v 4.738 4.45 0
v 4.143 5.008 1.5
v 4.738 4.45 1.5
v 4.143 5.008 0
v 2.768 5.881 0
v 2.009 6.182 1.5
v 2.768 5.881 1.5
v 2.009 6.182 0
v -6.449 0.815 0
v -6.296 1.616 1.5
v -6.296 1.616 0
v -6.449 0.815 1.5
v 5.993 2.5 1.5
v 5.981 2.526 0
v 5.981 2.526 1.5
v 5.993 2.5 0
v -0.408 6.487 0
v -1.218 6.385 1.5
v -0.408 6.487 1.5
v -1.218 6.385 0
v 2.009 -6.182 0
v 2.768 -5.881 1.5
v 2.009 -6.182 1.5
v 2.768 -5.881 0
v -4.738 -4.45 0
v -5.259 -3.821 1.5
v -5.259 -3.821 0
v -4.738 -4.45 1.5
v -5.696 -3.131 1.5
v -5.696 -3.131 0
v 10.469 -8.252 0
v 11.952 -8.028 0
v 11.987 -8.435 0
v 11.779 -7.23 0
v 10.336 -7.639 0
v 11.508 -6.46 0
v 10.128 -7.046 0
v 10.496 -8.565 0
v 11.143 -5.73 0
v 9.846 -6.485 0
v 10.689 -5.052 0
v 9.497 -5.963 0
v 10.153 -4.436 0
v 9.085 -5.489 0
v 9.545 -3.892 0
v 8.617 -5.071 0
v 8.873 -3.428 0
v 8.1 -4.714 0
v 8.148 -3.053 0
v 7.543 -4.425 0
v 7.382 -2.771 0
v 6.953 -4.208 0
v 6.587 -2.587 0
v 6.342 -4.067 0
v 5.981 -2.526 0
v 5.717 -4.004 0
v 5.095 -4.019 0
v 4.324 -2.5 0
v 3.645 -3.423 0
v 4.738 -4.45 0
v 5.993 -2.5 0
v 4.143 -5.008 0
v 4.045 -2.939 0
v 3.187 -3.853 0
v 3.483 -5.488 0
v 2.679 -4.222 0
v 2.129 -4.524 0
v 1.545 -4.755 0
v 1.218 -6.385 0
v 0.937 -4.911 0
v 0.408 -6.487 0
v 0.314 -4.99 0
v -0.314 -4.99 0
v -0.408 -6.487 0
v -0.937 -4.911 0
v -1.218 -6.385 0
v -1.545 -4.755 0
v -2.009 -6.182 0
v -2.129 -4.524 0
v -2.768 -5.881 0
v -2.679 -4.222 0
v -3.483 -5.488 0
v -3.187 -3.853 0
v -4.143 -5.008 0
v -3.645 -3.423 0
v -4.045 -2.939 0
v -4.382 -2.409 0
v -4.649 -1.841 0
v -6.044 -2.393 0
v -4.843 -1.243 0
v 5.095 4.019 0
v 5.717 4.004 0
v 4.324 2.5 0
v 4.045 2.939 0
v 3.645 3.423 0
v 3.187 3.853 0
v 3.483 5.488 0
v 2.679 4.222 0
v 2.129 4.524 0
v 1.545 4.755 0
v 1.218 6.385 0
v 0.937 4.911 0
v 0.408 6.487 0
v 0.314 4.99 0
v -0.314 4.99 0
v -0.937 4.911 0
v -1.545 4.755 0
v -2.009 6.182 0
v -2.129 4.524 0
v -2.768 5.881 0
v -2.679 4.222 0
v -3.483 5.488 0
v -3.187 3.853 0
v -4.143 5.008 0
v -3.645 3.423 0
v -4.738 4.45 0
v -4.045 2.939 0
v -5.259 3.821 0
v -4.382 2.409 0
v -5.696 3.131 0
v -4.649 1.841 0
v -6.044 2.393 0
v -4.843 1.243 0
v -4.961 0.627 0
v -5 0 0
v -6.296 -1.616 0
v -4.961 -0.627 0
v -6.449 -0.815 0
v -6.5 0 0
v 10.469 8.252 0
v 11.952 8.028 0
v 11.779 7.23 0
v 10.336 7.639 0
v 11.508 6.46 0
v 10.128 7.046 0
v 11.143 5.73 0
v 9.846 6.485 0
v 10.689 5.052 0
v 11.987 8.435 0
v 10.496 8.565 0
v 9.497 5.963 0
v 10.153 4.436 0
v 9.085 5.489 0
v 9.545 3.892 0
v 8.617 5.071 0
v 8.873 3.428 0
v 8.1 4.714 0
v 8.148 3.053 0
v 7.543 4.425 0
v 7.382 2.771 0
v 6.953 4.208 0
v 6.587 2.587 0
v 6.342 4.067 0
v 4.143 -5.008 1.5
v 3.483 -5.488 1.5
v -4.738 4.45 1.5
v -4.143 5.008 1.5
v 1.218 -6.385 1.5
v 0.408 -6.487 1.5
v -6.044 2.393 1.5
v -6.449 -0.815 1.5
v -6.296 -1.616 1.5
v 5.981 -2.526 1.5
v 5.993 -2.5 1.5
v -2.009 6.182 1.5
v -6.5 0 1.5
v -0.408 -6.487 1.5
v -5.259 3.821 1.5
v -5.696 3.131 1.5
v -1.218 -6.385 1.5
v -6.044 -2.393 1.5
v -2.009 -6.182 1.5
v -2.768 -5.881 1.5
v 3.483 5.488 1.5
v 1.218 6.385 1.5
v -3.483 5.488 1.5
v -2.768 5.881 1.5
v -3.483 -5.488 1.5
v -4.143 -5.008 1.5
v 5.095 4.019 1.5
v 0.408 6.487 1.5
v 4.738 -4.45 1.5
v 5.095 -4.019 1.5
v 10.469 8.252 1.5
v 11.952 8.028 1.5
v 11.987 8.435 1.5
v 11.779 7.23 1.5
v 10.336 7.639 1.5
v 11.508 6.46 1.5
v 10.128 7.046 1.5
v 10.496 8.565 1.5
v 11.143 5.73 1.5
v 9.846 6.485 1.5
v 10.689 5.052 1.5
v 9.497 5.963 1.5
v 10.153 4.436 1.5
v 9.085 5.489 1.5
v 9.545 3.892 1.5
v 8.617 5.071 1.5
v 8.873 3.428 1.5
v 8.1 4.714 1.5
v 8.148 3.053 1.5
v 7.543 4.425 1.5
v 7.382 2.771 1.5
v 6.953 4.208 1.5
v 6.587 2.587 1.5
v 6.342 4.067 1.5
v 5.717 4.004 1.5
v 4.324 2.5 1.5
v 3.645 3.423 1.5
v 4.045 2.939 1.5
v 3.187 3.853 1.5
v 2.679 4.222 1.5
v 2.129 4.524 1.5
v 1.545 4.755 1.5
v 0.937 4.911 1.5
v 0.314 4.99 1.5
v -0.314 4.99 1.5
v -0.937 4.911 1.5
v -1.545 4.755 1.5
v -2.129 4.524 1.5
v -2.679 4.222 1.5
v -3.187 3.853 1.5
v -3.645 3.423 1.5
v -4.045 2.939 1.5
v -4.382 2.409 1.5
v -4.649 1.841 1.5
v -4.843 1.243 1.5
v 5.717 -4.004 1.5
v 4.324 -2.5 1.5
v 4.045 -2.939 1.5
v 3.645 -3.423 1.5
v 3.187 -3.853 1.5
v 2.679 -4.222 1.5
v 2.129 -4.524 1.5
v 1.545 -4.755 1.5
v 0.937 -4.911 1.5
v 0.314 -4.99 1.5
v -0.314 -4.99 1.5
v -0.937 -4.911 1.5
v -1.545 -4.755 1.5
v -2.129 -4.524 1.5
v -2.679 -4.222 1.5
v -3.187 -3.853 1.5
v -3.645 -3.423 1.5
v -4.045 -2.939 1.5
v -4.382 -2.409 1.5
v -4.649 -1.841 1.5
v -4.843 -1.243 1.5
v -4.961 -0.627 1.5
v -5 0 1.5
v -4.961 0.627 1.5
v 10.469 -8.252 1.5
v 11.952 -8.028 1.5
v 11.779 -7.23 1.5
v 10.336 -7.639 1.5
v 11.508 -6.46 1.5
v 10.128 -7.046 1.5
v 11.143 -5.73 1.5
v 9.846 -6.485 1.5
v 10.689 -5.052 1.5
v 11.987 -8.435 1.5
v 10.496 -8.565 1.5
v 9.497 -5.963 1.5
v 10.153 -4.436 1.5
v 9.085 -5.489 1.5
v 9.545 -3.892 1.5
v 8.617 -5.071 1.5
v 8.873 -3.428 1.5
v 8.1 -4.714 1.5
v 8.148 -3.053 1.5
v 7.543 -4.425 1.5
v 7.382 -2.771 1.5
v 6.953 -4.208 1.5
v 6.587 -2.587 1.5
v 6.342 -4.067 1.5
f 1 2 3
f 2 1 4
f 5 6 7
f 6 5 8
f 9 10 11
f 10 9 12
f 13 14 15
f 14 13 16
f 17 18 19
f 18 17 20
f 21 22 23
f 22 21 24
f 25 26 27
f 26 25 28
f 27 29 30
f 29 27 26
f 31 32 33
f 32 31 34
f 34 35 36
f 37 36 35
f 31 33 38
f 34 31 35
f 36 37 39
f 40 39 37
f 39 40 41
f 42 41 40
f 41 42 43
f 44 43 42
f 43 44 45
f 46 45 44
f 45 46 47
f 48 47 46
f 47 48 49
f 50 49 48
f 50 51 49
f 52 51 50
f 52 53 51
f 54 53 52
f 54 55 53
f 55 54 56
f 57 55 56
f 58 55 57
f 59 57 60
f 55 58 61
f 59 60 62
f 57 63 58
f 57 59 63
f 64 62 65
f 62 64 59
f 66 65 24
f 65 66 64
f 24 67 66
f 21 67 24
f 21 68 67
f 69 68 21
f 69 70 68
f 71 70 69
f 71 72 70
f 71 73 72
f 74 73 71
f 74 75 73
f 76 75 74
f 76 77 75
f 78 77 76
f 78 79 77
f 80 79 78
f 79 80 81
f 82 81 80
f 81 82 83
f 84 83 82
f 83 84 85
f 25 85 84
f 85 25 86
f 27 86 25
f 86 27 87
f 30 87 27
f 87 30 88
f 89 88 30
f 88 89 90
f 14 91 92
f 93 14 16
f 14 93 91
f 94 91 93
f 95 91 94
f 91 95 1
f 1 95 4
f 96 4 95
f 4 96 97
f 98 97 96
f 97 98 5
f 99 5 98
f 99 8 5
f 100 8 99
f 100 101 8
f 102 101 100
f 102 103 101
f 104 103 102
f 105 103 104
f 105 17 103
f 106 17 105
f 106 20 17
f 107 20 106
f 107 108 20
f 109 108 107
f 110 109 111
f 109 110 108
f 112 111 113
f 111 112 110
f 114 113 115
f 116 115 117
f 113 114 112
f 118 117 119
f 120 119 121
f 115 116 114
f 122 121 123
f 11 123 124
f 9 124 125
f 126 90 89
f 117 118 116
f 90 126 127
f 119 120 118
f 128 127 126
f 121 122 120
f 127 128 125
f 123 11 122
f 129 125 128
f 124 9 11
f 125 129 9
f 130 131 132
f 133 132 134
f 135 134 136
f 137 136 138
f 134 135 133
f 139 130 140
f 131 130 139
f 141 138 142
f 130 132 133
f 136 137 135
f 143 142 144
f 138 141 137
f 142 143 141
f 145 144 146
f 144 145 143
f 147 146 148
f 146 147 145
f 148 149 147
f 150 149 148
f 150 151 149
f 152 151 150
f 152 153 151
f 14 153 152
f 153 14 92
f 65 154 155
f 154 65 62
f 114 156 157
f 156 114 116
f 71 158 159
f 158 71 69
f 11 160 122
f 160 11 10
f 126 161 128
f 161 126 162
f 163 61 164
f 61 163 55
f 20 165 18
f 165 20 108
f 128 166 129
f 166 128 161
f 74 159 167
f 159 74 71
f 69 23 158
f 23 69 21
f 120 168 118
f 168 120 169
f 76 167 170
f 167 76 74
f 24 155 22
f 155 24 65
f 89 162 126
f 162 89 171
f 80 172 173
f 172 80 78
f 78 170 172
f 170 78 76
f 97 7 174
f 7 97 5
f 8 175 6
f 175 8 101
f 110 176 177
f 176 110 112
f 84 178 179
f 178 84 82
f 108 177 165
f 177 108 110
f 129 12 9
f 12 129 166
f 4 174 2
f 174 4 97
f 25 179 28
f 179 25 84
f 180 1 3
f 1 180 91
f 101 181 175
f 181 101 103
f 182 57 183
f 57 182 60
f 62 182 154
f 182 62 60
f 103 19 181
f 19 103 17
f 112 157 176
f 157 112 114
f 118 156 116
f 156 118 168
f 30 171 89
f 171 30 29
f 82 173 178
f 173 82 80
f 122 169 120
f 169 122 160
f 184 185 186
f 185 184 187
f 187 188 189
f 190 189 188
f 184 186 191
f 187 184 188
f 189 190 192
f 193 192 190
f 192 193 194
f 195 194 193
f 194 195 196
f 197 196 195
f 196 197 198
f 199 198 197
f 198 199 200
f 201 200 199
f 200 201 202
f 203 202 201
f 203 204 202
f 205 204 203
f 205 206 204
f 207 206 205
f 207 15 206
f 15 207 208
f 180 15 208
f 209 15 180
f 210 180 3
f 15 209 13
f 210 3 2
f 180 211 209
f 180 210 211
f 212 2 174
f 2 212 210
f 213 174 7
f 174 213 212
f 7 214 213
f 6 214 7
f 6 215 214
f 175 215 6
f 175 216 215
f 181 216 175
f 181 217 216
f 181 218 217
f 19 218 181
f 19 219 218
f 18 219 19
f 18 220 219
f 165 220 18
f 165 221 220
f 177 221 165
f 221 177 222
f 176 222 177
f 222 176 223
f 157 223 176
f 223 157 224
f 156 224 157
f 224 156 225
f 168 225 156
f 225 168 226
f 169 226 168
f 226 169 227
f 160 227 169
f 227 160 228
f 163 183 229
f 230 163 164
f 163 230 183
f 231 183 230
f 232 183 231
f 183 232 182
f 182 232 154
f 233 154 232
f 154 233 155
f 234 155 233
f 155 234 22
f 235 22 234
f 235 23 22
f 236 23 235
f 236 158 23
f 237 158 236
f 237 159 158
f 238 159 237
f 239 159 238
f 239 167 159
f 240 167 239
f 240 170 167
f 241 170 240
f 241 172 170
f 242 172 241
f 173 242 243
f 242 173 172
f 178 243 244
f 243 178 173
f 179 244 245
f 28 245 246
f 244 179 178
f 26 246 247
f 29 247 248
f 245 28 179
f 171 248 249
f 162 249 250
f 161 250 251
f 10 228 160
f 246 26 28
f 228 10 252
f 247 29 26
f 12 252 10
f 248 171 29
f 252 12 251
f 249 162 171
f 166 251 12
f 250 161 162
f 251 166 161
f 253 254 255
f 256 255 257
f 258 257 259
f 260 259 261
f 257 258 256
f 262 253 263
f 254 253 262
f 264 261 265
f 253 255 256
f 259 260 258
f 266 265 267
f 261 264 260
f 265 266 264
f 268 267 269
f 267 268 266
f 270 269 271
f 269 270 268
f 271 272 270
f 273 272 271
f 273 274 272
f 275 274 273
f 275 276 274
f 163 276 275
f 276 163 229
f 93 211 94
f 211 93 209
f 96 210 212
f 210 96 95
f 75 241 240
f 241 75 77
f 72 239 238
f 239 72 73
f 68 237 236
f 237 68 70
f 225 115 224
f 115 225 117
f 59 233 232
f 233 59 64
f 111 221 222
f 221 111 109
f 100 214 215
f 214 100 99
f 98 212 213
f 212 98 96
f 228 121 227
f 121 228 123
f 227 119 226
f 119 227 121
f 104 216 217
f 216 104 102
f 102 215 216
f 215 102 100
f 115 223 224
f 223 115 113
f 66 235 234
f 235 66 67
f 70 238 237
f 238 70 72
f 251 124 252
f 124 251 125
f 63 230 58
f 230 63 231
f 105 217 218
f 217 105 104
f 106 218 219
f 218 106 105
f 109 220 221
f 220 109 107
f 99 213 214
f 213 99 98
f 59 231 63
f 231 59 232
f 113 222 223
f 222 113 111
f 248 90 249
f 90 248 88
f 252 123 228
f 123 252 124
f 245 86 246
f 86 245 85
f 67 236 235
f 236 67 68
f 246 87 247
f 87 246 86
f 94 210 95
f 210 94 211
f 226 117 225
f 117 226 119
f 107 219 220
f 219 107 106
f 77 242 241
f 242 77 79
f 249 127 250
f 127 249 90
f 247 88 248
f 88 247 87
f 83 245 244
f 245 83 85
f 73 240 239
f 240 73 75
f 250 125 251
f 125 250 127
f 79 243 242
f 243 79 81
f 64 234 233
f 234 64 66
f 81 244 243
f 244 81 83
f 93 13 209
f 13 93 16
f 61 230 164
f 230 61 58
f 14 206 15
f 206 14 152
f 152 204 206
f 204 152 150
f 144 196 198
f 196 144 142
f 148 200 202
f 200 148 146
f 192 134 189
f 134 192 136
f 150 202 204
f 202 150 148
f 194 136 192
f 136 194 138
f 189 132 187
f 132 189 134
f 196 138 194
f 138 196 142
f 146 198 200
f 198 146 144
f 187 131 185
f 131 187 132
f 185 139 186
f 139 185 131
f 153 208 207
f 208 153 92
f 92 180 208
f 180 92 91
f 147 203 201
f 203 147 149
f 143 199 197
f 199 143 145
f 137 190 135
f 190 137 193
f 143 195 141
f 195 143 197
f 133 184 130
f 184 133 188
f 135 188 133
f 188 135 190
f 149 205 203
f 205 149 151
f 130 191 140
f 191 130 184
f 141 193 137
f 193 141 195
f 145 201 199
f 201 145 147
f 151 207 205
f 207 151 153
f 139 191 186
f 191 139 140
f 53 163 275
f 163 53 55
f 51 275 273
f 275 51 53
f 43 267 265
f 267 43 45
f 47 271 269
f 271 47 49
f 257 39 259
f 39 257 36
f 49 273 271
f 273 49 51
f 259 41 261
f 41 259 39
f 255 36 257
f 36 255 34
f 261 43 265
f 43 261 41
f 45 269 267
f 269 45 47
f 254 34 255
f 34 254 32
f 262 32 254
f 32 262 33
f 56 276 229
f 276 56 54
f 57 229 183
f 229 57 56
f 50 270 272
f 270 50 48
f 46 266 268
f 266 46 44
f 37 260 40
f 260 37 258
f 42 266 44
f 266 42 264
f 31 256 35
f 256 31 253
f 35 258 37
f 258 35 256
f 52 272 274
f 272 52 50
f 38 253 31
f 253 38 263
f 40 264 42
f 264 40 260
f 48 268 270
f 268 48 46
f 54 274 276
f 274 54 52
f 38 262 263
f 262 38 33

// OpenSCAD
ScrewDiameter = 10;
Thikness = 1.5;

/* [HIDDEN] */
$fn = 50;

clip();

module clip(){
    difference(){
        cylinderHole(ScrewDiameter/2,Thikness);        
        translate([ScrewDiameter/4,-ScrewDiameter/4,-0.25]) 
            cube([ScrewDiameter*1.5,ScrewDiameter/2,Thikness+0.5]);
        
    }
    translate([ScrewDiameter/2+Thikness*0.35,ScrewDiameter*0.75+Thikness,0])
        rotate([0,0,-95])
            quarterCylinder();
    rotate([180,0,0])    
        translate([ScrewDiameter/2+Thikness*0.35,ScrewDiameter*0.75+Thikness,-Thikness])
            rotate([0,0,-95])
                quarterCylinder();
}

module cylinderHole(external, thickness){
    difference(){
        cylinder(r=external+thickness,h=thickness);
        translate([0,0,-0.25]) 
            cylinder(r=external,h=thickness+0.5);
    }
}
module quarterCylinder(external=ScrewDiameter/2,thickness=Thikness){
    intersection(){
        cylinderHole(external,thickness);
        translate([0,0,-0.5]) cube([external*2,external*2,thickness+1]);
    }    
}
